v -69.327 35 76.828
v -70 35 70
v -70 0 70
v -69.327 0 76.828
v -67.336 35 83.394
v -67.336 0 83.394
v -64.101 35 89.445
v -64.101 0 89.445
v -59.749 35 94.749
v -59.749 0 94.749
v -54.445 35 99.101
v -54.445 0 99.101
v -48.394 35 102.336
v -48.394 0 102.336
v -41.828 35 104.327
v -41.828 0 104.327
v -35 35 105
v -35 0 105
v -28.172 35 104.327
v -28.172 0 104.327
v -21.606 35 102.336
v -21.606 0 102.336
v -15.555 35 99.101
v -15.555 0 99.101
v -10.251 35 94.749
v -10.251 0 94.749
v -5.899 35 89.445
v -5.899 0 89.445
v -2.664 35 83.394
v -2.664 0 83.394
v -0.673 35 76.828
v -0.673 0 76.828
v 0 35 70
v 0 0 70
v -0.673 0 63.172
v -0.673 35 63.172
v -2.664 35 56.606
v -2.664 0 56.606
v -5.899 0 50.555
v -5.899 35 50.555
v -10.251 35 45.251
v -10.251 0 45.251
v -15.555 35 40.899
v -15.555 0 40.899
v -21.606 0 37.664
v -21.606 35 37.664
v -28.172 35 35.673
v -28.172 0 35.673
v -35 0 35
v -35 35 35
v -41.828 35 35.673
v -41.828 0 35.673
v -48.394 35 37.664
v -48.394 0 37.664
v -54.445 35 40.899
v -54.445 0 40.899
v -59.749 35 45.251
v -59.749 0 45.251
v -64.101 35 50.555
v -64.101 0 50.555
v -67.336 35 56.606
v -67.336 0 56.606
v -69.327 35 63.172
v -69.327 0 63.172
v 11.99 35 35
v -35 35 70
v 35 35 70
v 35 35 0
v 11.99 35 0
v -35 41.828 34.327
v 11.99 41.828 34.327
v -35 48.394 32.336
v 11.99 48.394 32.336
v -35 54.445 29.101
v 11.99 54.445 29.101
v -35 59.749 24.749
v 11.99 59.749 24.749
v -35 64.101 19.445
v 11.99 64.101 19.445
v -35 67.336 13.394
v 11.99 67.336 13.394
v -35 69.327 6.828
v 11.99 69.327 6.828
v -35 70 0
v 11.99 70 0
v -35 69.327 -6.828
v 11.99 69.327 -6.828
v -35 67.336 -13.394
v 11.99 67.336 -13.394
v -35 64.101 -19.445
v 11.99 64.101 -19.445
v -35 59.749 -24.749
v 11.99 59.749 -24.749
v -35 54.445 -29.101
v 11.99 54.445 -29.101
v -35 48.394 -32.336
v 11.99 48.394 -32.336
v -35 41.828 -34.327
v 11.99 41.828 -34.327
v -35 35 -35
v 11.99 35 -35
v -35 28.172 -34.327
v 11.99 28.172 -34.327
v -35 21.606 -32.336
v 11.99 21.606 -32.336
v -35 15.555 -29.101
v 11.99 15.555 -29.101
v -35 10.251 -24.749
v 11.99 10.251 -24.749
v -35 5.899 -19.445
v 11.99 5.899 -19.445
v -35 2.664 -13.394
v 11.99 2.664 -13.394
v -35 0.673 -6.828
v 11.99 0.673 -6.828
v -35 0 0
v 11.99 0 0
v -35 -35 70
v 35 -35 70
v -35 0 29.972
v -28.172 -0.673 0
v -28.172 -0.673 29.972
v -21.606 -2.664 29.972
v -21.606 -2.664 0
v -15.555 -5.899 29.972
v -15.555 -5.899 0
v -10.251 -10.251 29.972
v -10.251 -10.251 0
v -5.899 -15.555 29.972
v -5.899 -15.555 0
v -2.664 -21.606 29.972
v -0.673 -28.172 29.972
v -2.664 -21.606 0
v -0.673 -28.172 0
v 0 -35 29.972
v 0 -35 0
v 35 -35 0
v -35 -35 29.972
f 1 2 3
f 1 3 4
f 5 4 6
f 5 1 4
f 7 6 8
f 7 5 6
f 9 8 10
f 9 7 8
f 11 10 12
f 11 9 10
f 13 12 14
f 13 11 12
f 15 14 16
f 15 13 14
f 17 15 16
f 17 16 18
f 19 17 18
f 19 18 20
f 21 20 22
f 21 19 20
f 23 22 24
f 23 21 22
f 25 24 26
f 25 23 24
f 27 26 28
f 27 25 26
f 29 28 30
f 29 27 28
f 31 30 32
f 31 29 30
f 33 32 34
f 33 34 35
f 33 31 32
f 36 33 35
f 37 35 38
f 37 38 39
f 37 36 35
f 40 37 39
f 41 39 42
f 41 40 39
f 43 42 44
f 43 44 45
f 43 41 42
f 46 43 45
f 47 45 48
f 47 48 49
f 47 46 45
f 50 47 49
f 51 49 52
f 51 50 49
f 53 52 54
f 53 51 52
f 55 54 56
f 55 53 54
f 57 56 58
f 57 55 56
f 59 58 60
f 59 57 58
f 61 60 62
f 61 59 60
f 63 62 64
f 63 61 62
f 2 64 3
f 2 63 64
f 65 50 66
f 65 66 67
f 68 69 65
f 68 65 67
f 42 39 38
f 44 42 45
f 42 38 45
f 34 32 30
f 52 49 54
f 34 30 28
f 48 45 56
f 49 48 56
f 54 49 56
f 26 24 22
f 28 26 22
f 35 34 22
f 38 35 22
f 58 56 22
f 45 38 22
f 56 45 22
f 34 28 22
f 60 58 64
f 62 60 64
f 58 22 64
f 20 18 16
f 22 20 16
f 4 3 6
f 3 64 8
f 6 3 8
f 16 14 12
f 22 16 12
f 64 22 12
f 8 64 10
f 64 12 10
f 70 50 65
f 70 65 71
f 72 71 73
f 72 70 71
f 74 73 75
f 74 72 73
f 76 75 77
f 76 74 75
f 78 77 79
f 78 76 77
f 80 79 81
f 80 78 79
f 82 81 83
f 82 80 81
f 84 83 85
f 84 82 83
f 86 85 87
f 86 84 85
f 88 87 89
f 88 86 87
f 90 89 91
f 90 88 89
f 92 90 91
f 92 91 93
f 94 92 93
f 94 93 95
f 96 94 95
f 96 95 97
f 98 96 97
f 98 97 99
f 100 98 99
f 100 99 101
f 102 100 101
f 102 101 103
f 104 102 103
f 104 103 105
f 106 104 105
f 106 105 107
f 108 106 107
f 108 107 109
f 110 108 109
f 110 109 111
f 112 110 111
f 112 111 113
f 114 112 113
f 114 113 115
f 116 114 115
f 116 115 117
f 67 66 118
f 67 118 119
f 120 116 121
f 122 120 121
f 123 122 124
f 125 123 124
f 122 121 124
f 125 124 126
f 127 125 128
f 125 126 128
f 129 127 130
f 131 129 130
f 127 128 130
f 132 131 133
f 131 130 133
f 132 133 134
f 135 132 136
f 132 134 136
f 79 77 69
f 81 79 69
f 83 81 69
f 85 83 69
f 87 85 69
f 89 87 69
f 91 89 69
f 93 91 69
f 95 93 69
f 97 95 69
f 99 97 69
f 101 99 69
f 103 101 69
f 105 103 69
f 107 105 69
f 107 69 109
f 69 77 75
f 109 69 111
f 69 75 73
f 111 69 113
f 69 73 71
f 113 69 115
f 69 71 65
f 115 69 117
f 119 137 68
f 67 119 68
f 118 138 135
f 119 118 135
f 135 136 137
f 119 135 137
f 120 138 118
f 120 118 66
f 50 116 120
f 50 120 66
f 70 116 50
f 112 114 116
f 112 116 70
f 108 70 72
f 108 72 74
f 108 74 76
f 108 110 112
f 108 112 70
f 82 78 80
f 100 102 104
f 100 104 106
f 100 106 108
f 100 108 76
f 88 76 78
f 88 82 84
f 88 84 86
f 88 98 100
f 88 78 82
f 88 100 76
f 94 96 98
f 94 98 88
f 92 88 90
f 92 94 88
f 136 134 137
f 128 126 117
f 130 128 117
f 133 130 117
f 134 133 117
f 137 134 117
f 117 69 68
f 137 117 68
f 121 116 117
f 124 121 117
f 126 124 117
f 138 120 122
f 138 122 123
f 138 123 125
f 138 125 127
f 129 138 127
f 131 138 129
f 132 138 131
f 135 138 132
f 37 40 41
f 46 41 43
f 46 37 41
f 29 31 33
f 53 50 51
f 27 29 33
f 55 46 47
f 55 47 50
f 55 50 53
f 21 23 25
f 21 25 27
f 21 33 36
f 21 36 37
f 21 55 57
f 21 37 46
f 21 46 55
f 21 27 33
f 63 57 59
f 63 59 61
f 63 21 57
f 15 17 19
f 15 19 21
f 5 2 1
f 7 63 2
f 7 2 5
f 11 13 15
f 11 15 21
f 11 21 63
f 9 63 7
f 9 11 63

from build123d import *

# Parameters (mm, degrees)
F0_W     = 70
F0_H     = 70
F1_DEPTH = 70
F3_DEPTH = 29.972
F4_R     = 35
F5_DEPTH = 35
F6_R     = 35
F7_DEPTH = 46.99


with BuildPart() as f1:
    # F0 (on Top) → F1 (new body)
    with BuildSketch(Plane.XY):
        Rectangle(F0_W, F0_H)
    extrude(amount=F1_DEPTH)

    # F2 (on face) → F3 (cut)
    with BuildSketch(Plane(origin=(0, 0, 0), x_dir=(1, 0, 0), z_dir=(0, 0, -1))):
        with BuildLine():
            ThreePointArc((-35, 0), (-10.2512626585, 10.2512626585), (0, 35))
            Line((0, 35), (-35, 35))
            Line((-35, 35), (-35, 0))
        make_face()
    extrude(amount=-F3_DEPTH, mode=Mode.SUBTRACT)

    # F6 (on face) → F7 (join)
    with BuildSketch(Plane(origin=(-35, 0, 0), x_dir=(0, -1, 0), z_dir=(-1, 0, 0))):
        with Locations((-35, 0)):
            Circle(F6_R)
    extrude(amount=-F7_DEPTH)


with BuildPart() as f5:
    # F4 (on face) → F5 (new body)
    with BuildSketch(Plane(origin=(0, 35, 0), x_dir=(-1, 0, 0), z_dir=(0, 1, 0))):
        with Locations((35, 70)):
            Circle(F4_R)
    extrude(amount=-F5_DEPTH)


solid = Compound([f1.part, f5.part])
